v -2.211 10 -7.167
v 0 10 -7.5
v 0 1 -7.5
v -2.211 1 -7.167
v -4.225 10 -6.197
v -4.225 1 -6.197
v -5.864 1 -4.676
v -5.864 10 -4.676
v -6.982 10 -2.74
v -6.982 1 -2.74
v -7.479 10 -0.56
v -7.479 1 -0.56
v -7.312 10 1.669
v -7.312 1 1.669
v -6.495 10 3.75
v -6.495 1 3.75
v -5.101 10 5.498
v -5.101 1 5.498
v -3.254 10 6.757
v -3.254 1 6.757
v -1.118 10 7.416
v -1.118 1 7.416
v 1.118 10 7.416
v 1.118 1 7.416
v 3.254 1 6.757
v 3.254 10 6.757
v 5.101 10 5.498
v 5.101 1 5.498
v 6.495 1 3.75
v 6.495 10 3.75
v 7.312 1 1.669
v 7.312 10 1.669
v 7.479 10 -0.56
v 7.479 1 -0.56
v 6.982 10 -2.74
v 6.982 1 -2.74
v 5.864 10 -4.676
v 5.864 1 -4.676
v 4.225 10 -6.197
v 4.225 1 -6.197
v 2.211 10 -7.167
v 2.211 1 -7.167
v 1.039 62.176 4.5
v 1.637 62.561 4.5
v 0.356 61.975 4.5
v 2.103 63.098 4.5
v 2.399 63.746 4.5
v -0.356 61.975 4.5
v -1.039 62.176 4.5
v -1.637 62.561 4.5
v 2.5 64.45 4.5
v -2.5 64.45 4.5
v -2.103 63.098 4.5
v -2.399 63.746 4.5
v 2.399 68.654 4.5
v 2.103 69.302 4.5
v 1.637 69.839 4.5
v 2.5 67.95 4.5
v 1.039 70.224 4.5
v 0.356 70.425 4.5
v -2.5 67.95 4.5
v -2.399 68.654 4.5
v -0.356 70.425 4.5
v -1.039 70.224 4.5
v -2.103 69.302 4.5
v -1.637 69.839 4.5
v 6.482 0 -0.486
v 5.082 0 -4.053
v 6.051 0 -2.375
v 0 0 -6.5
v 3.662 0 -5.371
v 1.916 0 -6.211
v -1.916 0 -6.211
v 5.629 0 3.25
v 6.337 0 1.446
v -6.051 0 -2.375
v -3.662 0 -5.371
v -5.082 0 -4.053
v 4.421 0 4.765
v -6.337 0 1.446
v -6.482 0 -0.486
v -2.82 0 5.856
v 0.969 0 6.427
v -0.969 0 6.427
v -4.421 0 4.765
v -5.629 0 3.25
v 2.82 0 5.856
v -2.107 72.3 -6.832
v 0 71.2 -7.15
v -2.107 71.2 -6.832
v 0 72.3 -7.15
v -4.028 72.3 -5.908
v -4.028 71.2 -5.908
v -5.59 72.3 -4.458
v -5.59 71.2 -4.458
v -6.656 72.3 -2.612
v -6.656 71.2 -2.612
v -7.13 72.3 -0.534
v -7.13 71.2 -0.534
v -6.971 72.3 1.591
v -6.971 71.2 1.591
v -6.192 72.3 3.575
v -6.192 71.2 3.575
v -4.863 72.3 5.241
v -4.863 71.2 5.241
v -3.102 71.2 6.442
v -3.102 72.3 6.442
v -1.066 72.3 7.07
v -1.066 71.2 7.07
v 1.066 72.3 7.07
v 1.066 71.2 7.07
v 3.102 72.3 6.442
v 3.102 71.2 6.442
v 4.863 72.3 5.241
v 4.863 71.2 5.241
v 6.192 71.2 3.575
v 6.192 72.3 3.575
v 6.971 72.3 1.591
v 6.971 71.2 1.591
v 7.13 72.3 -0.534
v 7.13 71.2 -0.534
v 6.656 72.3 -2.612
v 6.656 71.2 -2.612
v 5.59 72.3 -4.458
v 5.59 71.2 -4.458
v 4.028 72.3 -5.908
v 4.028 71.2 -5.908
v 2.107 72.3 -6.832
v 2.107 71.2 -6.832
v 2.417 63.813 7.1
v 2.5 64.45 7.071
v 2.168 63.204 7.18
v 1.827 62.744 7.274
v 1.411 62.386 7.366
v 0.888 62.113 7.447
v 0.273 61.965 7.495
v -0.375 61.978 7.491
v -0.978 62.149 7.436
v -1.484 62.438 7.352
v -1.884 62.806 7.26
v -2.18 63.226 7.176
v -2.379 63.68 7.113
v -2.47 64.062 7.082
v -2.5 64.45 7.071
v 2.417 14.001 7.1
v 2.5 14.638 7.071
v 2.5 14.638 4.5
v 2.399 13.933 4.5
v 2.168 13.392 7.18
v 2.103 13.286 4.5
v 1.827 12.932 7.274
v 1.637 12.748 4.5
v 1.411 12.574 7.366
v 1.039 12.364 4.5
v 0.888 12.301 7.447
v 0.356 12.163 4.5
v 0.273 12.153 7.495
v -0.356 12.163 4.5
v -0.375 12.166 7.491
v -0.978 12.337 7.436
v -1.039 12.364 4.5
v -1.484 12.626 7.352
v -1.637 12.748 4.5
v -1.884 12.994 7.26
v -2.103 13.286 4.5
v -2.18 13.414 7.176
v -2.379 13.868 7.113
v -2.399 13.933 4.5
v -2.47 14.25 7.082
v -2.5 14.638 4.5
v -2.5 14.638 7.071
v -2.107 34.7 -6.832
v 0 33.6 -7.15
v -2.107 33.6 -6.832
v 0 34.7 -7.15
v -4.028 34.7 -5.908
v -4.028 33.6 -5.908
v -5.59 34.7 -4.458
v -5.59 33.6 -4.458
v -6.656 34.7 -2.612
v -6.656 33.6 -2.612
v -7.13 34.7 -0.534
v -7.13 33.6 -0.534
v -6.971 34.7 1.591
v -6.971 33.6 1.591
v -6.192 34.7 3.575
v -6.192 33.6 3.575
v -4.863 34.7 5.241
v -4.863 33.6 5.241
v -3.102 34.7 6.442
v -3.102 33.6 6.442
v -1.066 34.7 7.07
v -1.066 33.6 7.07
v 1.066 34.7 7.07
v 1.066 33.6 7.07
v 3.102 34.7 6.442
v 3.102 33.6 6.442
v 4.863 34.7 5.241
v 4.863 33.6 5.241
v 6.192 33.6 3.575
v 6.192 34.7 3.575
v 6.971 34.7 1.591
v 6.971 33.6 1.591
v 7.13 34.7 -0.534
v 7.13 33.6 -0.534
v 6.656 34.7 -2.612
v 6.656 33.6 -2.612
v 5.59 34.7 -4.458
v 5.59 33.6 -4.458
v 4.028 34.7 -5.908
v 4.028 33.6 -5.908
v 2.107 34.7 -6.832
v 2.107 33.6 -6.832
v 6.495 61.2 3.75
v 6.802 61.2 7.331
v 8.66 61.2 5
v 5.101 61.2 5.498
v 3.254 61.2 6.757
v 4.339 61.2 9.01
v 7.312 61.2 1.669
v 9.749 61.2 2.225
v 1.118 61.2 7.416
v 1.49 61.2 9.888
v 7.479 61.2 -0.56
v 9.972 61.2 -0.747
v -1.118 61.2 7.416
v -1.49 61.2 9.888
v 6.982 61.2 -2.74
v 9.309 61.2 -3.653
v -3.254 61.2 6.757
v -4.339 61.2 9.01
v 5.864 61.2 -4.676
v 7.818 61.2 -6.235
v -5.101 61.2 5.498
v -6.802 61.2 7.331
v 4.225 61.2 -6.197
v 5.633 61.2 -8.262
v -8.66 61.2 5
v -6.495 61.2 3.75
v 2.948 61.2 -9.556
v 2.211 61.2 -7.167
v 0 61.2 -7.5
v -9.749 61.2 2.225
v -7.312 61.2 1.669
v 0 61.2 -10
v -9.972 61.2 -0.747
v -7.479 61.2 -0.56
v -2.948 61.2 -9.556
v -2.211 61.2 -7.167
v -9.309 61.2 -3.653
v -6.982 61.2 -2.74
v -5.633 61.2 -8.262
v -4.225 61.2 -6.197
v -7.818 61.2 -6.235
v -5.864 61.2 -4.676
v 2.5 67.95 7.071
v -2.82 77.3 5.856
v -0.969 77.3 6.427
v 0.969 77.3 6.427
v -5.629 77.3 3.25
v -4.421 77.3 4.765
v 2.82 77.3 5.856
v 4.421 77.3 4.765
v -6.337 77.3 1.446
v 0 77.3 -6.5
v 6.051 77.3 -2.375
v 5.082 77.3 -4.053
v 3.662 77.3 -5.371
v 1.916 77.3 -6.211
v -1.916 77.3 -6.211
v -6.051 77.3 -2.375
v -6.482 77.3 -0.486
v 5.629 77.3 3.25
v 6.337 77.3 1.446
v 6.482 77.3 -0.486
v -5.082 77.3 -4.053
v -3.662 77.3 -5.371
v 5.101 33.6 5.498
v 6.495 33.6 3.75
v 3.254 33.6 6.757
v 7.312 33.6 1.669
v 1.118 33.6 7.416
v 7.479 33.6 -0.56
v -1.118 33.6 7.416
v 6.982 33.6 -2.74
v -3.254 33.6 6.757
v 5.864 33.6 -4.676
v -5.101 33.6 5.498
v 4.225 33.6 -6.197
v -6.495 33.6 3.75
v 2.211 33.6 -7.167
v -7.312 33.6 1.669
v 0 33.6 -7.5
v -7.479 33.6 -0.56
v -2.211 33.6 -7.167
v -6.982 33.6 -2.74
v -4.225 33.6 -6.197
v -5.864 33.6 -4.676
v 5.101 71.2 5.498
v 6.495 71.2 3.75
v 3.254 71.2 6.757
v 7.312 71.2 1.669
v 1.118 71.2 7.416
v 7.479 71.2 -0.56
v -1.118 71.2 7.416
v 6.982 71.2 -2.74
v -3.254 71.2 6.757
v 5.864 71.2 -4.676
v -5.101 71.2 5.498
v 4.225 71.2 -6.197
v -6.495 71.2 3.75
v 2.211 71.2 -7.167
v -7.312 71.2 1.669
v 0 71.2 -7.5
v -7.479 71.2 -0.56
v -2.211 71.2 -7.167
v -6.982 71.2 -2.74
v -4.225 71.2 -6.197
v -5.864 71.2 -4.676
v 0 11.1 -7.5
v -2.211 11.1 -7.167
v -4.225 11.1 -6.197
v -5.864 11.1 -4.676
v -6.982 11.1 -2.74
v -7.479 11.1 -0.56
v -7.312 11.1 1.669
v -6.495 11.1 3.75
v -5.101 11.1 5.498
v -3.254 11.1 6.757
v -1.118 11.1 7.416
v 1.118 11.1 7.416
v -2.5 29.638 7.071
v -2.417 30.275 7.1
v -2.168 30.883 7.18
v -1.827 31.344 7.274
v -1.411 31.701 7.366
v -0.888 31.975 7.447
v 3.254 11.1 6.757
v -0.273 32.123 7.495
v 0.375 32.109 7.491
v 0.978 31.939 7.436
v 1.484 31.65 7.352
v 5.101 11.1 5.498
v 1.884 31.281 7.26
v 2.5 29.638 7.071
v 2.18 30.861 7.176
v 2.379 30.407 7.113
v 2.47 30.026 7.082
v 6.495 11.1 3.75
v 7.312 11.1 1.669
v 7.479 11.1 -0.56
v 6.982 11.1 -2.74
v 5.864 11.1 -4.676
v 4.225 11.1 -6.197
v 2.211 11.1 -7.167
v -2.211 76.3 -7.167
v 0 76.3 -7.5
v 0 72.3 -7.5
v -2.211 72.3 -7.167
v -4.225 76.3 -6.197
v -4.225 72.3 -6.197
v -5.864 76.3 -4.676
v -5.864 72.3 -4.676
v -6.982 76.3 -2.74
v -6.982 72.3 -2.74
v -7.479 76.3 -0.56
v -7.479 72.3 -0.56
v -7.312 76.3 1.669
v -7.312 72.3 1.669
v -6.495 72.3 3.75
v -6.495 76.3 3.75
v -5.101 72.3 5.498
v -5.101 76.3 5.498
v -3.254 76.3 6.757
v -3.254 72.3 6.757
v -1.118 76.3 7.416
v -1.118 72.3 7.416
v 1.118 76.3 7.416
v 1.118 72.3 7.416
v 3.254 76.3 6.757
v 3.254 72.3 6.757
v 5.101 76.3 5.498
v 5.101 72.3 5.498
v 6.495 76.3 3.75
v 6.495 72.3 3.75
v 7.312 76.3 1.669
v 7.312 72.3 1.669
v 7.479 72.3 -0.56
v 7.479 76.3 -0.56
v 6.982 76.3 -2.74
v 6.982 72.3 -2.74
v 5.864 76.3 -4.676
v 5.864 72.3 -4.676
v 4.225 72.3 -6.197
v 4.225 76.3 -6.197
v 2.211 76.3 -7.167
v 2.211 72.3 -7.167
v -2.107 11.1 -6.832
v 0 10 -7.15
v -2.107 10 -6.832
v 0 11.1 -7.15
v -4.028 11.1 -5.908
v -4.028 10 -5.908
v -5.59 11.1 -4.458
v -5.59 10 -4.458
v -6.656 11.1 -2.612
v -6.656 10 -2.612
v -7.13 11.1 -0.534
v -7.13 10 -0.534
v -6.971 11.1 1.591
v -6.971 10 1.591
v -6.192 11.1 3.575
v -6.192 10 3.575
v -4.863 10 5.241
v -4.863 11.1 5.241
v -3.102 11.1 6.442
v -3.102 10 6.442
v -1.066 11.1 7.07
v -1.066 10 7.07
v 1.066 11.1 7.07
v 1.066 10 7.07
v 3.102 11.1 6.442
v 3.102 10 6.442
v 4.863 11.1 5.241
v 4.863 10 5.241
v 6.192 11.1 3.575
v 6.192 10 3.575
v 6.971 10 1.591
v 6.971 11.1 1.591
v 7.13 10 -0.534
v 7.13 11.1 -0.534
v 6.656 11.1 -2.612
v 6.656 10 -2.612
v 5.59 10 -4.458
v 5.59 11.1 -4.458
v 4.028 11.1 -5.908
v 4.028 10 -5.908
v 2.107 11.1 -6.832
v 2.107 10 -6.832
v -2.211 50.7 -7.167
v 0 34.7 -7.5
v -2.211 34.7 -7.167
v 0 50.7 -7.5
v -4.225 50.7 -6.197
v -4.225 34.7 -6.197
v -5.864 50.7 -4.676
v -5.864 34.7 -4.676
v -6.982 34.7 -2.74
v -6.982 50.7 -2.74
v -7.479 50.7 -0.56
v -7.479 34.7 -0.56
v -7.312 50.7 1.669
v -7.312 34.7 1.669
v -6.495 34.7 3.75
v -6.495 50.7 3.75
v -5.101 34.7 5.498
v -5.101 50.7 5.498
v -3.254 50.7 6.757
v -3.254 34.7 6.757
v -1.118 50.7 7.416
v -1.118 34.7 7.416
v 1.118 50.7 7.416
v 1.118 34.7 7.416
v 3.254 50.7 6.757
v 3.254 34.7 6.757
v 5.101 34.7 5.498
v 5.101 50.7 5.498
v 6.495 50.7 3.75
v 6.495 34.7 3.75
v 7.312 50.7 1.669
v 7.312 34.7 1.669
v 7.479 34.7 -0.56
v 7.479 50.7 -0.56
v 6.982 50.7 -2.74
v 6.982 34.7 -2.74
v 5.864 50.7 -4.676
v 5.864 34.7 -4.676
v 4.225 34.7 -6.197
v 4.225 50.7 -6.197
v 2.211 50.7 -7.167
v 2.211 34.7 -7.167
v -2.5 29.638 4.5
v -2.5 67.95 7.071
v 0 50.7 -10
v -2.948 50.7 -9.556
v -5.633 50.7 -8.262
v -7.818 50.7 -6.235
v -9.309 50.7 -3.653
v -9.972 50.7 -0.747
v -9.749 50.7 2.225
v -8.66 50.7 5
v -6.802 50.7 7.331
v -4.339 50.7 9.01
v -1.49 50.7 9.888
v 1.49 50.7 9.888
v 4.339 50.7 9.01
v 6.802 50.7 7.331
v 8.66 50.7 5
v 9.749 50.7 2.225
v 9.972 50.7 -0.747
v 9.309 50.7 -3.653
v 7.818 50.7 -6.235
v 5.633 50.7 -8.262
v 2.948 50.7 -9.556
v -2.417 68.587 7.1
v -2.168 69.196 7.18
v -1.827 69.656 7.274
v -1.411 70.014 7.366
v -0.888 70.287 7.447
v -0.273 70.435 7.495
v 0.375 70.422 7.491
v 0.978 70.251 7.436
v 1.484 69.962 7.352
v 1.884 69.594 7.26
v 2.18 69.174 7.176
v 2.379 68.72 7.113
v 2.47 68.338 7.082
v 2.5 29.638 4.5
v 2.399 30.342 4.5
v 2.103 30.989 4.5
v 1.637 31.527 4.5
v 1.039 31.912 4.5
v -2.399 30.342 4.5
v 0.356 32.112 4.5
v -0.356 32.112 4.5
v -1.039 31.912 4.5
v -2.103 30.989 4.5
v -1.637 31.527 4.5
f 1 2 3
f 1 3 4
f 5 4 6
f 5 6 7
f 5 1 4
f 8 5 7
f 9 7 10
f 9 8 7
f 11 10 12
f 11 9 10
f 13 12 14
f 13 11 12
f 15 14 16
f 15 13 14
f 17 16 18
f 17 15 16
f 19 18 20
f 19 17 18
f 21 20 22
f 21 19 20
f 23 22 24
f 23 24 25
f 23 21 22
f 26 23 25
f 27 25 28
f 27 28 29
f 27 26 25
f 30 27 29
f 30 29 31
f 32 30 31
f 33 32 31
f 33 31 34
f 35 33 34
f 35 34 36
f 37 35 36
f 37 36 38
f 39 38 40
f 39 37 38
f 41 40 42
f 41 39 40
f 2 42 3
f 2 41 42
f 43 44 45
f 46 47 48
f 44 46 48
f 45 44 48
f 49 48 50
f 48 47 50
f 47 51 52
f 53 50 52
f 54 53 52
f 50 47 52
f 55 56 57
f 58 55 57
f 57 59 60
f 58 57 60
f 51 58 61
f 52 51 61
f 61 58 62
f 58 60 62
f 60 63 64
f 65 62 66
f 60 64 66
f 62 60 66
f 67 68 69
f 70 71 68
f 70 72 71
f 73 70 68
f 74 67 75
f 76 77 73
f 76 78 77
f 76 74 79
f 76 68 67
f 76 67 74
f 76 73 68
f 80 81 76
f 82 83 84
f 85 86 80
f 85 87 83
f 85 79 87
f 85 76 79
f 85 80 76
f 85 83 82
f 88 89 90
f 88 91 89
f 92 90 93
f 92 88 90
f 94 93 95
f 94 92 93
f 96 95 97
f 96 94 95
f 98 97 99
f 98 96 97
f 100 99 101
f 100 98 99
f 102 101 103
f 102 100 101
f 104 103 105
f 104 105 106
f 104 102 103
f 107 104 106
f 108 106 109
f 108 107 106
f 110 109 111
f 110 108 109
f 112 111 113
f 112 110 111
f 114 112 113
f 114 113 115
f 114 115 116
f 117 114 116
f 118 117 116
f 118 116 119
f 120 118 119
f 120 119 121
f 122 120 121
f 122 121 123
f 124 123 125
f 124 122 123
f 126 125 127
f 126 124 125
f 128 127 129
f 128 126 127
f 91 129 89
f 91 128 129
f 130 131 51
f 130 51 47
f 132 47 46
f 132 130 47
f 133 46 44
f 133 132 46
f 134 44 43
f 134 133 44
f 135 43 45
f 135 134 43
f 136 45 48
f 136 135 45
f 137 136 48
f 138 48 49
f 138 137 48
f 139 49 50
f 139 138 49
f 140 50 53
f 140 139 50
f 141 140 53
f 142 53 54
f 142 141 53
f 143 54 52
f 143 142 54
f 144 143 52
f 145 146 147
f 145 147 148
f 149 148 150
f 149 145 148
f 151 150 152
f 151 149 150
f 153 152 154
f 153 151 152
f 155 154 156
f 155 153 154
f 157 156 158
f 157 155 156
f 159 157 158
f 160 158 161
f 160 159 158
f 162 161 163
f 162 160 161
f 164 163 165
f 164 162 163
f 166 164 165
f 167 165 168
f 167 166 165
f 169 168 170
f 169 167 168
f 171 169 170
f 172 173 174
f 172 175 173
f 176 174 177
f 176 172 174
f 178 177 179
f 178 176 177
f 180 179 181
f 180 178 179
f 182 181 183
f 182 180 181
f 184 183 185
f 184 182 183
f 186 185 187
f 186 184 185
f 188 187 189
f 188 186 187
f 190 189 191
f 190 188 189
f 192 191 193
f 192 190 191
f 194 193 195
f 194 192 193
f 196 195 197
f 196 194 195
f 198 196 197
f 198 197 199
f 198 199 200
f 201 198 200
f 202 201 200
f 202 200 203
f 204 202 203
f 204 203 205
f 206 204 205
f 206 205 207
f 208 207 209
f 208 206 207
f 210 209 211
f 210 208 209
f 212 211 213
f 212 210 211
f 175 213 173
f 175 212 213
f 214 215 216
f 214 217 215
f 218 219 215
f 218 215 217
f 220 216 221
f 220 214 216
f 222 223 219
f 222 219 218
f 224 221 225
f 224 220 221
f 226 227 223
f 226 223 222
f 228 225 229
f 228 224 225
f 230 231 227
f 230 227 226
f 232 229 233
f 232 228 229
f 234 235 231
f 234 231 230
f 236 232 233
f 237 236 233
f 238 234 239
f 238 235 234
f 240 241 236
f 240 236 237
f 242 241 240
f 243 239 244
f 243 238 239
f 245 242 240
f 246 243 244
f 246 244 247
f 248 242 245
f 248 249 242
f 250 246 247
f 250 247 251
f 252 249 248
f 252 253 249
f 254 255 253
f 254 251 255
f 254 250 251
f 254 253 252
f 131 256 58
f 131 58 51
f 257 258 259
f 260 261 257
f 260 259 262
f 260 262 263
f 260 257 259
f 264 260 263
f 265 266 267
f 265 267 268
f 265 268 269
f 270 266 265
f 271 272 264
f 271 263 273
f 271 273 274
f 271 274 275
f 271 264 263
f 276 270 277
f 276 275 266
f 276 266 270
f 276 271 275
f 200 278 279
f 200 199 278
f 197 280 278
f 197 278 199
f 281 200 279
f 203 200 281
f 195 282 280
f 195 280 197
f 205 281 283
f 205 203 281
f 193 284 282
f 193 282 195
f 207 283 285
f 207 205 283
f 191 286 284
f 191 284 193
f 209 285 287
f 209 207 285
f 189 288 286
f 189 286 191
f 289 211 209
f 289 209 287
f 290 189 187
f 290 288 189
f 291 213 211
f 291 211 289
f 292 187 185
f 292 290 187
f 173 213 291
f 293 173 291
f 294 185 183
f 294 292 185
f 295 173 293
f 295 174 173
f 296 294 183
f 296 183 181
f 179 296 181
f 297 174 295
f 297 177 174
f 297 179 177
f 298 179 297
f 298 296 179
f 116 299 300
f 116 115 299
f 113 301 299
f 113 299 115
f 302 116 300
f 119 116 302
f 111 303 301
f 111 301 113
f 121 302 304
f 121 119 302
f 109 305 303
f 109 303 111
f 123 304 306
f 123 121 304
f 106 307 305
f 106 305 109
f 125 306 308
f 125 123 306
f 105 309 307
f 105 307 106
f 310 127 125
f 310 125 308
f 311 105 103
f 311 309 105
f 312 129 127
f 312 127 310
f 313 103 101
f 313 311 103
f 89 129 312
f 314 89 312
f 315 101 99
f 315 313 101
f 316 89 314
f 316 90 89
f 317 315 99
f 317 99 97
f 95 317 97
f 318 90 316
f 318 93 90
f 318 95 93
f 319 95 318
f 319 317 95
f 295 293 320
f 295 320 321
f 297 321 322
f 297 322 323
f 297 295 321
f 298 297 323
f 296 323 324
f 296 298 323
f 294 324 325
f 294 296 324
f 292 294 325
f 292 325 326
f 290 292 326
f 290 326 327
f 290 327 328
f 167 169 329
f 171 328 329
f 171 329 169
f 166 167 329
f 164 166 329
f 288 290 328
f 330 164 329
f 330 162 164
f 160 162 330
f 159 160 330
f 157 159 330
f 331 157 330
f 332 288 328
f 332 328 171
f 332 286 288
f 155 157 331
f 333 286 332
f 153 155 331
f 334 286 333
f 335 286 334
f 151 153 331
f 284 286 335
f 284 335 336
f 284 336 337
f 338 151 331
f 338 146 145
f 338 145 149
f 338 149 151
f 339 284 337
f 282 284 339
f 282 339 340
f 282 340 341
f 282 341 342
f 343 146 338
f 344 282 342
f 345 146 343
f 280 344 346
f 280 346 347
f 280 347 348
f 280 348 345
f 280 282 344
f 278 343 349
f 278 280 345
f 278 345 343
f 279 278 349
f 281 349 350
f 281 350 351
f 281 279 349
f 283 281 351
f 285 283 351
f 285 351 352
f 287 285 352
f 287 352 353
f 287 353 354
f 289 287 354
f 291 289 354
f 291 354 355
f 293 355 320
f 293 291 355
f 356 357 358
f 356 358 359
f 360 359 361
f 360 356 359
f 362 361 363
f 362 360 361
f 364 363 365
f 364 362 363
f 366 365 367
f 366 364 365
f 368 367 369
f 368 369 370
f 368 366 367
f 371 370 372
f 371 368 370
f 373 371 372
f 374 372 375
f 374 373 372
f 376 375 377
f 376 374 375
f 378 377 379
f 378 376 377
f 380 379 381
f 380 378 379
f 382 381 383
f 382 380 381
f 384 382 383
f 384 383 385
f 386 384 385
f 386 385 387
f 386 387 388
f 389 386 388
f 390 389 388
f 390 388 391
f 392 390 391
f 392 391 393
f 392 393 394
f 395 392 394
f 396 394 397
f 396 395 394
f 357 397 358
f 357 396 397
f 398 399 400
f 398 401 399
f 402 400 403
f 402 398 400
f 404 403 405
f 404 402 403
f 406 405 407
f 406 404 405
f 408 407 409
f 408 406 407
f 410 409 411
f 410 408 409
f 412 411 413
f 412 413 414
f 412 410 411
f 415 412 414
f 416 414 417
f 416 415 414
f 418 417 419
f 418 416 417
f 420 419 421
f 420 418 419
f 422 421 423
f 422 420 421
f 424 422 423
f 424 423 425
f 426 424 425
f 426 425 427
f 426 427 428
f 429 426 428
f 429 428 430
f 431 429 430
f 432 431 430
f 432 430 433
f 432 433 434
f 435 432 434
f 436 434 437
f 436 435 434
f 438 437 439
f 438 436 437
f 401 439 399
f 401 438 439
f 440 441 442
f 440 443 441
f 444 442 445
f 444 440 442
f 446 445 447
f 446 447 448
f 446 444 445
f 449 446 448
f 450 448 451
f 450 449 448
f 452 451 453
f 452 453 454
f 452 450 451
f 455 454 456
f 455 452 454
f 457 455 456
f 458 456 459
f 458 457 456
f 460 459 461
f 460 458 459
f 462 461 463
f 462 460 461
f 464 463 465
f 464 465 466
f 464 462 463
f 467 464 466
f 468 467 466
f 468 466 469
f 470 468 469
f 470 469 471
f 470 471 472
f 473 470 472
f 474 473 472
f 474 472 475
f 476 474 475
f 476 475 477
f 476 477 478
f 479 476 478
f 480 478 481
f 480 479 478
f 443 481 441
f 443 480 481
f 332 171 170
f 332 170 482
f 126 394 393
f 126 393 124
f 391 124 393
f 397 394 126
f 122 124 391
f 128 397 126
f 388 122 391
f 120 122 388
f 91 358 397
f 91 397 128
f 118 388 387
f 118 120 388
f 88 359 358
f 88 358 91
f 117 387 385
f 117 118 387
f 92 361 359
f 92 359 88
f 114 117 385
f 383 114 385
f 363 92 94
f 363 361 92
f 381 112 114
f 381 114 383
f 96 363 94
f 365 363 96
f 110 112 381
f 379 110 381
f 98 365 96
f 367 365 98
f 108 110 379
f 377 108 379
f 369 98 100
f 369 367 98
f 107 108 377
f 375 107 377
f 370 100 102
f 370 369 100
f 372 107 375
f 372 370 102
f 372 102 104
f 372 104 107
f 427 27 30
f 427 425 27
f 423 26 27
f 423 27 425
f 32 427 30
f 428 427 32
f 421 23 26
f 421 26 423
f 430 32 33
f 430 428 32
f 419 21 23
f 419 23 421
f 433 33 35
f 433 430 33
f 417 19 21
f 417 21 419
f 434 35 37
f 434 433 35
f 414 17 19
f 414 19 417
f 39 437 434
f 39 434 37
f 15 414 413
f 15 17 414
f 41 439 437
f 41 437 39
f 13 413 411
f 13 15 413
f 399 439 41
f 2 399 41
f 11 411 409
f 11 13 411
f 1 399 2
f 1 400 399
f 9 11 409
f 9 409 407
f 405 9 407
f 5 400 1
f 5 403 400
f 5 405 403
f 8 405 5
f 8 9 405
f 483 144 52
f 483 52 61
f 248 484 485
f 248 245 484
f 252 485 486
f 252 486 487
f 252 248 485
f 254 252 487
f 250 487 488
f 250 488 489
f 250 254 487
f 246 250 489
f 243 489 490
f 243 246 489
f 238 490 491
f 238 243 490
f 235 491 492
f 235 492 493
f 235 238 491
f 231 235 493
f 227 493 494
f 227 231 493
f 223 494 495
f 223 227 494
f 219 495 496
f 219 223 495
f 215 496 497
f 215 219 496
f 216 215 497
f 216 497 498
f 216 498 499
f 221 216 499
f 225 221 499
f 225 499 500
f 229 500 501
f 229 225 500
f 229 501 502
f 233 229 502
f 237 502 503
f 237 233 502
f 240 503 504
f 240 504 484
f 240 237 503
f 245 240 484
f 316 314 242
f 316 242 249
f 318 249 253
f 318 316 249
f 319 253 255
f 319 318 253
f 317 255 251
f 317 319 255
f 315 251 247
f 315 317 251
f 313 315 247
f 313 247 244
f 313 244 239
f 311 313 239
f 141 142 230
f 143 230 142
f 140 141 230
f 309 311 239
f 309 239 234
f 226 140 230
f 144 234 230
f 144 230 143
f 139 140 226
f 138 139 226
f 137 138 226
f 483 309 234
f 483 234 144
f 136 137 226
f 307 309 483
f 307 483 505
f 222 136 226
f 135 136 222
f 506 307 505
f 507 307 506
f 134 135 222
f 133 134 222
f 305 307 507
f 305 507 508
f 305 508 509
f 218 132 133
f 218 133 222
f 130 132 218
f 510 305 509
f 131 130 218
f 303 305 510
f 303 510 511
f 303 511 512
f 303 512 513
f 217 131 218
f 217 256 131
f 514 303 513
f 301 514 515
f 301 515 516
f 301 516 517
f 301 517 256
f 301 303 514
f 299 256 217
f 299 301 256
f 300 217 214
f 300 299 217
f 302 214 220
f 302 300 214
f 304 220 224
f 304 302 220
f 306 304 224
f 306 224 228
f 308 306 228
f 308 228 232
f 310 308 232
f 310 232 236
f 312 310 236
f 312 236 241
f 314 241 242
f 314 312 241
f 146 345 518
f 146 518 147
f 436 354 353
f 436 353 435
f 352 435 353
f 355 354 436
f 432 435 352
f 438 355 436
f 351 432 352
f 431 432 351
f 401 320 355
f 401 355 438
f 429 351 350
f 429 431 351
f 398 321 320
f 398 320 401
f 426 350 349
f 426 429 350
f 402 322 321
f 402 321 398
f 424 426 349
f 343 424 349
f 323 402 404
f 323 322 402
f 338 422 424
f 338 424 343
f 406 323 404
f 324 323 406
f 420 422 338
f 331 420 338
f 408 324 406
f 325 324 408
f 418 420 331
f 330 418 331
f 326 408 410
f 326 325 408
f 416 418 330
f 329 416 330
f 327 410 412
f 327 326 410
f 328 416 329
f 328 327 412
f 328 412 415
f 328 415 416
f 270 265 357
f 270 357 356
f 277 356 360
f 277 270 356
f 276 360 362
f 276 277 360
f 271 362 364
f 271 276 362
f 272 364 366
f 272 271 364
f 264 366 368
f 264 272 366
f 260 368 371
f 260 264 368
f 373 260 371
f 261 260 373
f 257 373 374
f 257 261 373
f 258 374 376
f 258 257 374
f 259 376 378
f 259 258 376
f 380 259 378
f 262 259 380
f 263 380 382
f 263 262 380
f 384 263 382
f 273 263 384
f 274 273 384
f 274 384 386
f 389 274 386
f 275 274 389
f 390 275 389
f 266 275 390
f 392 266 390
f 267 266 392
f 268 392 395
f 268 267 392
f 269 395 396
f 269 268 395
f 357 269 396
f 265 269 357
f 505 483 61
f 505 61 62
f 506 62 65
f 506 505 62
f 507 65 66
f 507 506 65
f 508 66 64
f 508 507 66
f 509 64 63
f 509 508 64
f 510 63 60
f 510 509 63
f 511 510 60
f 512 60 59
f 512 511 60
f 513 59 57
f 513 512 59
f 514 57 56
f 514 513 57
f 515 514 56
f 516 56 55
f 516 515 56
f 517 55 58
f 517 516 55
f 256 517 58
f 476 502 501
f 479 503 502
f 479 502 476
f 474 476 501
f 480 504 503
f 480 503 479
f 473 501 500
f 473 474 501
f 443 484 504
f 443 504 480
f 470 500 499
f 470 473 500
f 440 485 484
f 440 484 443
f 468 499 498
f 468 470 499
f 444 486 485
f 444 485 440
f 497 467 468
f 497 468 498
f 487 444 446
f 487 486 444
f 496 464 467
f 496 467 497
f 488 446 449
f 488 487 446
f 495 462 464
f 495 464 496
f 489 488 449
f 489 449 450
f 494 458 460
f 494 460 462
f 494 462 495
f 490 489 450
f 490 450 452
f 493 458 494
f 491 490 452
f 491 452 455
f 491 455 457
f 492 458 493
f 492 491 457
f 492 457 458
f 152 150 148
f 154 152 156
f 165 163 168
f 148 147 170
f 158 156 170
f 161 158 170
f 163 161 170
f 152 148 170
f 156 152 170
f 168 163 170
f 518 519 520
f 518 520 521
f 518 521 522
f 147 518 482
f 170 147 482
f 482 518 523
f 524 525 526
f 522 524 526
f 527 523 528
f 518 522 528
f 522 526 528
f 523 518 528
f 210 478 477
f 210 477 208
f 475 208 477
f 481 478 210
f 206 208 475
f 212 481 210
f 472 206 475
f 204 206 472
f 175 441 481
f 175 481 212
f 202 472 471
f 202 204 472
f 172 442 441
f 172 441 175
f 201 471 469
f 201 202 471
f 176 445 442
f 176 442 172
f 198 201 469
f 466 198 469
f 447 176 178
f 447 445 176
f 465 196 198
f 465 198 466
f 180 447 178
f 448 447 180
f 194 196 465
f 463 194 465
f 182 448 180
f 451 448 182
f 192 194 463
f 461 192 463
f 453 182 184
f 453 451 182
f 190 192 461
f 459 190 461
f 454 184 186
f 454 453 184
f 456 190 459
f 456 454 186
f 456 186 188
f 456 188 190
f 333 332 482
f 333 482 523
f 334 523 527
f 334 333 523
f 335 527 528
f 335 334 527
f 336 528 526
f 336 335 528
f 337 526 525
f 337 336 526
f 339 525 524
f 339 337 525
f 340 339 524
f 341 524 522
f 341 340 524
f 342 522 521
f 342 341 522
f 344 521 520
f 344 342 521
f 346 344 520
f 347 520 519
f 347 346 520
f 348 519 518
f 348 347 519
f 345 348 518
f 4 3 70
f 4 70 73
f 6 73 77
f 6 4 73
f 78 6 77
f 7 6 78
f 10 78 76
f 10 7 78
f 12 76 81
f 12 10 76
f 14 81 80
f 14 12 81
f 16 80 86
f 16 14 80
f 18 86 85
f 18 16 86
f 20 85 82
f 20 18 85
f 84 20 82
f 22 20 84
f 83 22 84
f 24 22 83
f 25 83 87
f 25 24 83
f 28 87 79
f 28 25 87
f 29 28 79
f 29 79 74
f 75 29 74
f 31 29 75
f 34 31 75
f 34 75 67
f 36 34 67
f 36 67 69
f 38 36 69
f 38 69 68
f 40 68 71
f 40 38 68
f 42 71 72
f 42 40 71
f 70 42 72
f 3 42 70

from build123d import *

# Parameters (mm, degrees)
SFAZOWANIE1_SIZE           = 1
WYTNIJ_WYCI_GNI_CIE1_DEPTH = 3


with BuildPart() as part:
    # Szkic1 → Obrót1 (revolve)
    with BuildSketch(Plane.XY, mode=Mode.PRIVATE) as obr_t1_sk:
        Polygon((0, 0), (-7.5, 0), (-7.5, 10), (-7.15, 10), (-7.15, 11.1), (-7.5, 11.1), (-7.5, 33.6), (-7.15, 33.6), (-7.15, 34.7), (-7.5, 34.7), (-7.5, 50.7), (-10, 50.7), (-10, 61.2), (-7.5, 61.2), (-7.5, 71.2), (-7.15, 71.2), (-7.15, 72.3), (-7.5, 72.3), (-7.5, 77.3), (0, 77.3), align=None)
    revolve(obr_t1_sk.sketch.rotate(Axis((0, 0, 0), (0, 1, 0)), 270), axis=Axis((0, 0, 0), (0, 1, 0)))

    # Sfazowanie1
    sfazowanie1_edges = [part.edges().sort_by_distance(p)[0] for p in [
        (0, 77.3, 7.5),
        (0, 0, 7.5),
    ]]
    chamfer(sfazowanie1_edges, length=SFAZOWANIE1_SIZE)

    # Szkic2 → Wytnij-wyciągnięcie1 (cut)
    with BuildSketch(Plane.XY.offset(7.5)):
        with BuildLine():
            Line((-2.5, 14.637705083), (-2.5, 29.637705083))
            ThreePointArc((-2.5, 29.637705083), (0, 32.137705083), (2.5, 29.637705083))
            Line((2.5, 29.637705083), (2.5, 14.637705083))
            ThreePointArc((2.5, 14.637705083), (0, 12.137705083), (-2.5, 14.637705083))
        make_face()
        with BuildLine():
            Line((-2.5, 64.45), (-2.5, 67.95))
            ThreePointArc((-2.5, 67.95), (0, 70.45), (2.5, 67.95))
            Line((2.5, 67.95), (2.5, 64.45))
            ThreePointArc((2.5, 64.45), (0, 61.95), (-2.5, 64.45))
        make_face()
    extrude(amount=-WYTNIJ_WYCI_GNI_CIE1_DEPTH, mode=Mode.SUBTRACT)


solid = part.part
